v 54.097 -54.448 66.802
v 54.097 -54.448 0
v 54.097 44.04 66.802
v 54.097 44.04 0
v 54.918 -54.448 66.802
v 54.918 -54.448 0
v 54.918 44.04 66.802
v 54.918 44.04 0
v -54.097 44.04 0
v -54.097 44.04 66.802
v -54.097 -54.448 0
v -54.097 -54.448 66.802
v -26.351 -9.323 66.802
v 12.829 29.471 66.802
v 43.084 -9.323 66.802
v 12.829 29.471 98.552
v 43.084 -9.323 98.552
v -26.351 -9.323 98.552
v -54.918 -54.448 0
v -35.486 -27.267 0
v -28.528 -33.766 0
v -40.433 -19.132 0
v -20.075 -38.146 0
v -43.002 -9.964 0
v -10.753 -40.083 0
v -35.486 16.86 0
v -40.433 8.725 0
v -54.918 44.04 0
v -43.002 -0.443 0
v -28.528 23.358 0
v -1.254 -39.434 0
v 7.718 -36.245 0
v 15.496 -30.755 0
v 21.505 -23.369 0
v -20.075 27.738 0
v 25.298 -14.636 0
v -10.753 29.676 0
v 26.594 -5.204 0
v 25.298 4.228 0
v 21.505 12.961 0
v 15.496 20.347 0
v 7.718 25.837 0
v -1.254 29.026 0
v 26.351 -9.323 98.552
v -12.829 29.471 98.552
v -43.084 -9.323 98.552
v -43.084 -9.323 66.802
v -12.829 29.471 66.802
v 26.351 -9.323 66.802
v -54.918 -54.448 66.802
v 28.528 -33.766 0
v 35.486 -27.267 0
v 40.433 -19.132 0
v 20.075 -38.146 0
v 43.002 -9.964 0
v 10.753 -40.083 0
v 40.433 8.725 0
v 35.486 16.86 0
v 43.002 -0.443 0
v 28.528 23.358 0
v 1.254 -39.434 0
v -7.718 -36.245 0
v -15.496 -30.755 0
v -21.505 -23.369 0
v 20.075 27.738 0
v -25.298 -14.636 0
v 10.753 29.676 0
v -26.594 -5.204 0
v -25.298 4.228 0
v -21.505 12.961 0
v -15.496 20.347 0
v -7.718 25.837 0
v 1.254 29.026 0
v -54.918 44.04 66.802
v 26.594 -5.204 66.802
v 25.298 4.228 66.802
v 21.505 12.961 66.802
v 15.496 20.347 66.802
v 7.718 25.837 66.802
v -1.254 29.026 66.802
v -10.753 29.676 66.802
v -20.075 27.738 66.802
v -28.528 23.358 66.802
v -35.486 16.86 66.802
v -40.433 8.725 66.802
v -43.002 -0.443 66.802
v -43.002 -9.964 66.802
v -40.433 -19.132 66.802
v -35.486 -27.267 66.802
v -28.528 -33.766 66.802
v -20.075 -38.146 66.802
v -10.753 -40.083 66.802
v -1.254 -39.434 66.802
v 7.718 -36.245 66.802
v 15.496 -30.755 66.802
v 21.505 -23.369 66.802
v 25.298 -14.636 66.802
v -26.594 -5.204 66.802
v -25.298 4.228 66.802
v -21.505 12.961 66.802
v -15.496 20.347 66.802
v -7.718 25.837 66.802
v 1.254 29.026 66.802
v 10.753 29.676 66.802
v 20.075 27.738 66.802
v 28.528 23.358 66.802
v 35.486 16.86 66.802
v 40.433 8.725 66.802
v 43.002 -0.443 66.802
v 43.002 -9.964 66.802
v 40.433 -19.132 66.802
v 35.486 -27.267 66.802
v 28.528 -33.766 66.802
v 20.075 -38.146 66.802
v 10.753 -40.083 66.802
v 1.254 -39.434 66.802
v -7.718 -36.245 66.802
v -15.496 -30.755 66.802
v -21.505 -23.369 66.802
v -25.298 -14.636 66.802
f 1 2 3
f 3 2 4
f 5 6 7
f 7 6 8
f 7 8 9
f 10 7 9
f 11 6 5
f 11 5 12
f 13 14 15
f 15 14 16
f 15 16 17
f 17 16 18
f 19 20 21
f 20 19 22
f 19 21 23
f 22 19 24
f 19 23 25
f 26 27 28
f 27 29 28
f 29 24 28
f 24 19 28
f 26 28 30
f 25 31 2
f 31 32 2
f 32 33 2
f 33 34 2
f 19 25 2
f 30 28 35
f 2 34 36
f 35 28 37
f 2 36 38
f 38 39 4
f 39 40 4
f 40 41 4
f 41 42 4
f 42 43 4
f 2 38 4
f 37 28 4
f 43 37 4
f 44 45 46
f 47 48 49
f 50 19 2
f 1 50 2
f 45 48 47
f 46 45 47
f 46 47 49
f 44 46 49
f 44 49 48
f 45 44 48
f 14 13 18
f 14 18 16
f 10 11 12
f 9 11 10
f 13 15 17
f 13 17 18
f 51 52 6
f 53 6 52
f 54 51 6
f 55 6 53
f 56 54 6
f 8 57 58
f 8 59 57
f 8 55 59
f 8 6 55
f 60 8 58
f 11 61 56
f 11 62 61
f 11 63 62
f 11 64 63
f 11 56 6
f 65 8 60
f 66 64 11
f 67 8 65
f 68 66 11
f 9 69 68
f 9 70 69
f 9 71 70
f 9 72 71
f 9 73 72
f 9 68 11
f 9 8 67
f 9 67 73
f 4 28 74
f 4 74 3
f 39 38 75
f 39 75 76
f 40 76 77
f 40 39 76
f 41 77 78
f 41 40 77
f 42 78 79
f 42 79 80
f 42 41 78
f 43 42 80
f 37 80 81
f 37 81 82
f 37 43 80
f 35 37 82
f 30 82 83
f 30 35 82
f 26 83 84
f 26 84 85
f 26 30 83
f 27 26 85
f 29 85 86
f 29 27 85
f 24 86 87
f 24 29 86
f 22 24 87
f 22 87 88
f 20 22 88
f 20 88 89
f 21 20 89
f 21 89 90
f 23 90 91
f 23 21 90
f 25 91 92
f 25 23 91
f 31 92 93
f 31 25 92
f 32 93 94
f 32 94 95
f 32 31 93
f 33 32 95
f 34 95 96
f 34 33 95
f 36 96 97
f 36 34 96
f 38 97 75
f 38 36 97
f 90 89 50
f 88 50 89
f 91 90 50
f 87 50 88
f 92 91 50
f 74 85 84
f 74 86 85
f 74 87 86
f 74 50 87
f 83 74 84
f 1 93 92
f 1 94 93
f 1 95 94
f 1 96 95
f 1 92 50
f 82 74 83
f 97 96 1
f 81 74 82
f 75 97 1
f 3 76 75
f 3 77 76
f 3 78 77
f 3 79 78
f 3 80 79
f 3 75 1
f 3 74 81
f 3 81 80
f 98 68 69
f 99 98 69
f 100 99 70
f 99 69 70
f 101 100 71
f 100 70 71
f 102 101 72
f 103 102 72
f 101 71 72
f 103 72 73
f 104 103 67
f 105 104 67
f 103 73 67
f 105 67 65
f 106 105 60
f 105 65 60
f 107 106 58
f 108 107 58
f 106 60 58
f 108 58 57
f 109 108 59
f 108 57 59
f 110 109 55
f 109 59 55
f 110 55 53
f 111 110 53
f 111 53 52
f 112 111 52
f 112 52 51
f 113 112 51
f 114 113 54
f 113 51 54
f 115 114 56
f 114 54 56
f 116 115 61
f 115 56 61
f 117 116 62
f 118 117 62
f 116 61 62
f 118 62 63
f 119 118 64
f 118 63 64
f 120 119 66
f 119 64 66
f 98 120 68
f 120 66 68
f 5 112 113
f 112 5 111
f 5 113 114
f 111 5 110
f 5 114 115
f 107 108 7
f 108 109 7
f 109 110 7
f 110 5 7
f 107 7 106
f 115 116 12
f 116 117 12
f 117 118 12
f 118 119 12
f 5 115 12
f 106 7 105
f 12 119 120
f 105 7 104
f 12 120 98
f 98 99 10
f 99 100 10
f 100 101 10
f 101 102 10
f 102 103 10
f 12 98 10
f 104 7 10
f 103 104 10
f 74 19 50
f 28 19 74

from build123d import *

# Parameters (mm, degrees)
F0_W     = 109.015446
F0_H     = 98.48763
F0_R     = 34.960956
F1_DEPTH = 66.802
F3_DEPTH = 31.75


with BuildPart() as f1:
    # F0 (on Top) → F1 (new body)
    with BuildSketch(Plane.XY):
        with Locations((-0.410335, -5.203914)):
            Rectangle(F0_W, F0_H)
        with Locations((-8.366811, -5.203914)):
            Circle(F0_R, mode=Mode.SUBTRACT)
    extrude(amount=F1_DEPTH)


with BuildPart() as f3:
    # F2 (on face) → F3 (new body)
    with BuildSketch(Plane.XY.offset(66.802)):
        Polygon((-12.829339, 29.471067), (-43.084222, -9.323362), (26.3506, -9.323362), align=None)
    extrude(amount=F3_DEPTH)


with BuildPart() as f4_1:
    # F4: instance of F3
    add(f3.part.mirror(Plane.YZ))


with BuildPart() as f4_2:
    # F4: instance of F1
    add(f1.part.mirror(Plane.YZ))


solid = Compound([f1.part, f3.part, f4_1.part, f4_2.part])
